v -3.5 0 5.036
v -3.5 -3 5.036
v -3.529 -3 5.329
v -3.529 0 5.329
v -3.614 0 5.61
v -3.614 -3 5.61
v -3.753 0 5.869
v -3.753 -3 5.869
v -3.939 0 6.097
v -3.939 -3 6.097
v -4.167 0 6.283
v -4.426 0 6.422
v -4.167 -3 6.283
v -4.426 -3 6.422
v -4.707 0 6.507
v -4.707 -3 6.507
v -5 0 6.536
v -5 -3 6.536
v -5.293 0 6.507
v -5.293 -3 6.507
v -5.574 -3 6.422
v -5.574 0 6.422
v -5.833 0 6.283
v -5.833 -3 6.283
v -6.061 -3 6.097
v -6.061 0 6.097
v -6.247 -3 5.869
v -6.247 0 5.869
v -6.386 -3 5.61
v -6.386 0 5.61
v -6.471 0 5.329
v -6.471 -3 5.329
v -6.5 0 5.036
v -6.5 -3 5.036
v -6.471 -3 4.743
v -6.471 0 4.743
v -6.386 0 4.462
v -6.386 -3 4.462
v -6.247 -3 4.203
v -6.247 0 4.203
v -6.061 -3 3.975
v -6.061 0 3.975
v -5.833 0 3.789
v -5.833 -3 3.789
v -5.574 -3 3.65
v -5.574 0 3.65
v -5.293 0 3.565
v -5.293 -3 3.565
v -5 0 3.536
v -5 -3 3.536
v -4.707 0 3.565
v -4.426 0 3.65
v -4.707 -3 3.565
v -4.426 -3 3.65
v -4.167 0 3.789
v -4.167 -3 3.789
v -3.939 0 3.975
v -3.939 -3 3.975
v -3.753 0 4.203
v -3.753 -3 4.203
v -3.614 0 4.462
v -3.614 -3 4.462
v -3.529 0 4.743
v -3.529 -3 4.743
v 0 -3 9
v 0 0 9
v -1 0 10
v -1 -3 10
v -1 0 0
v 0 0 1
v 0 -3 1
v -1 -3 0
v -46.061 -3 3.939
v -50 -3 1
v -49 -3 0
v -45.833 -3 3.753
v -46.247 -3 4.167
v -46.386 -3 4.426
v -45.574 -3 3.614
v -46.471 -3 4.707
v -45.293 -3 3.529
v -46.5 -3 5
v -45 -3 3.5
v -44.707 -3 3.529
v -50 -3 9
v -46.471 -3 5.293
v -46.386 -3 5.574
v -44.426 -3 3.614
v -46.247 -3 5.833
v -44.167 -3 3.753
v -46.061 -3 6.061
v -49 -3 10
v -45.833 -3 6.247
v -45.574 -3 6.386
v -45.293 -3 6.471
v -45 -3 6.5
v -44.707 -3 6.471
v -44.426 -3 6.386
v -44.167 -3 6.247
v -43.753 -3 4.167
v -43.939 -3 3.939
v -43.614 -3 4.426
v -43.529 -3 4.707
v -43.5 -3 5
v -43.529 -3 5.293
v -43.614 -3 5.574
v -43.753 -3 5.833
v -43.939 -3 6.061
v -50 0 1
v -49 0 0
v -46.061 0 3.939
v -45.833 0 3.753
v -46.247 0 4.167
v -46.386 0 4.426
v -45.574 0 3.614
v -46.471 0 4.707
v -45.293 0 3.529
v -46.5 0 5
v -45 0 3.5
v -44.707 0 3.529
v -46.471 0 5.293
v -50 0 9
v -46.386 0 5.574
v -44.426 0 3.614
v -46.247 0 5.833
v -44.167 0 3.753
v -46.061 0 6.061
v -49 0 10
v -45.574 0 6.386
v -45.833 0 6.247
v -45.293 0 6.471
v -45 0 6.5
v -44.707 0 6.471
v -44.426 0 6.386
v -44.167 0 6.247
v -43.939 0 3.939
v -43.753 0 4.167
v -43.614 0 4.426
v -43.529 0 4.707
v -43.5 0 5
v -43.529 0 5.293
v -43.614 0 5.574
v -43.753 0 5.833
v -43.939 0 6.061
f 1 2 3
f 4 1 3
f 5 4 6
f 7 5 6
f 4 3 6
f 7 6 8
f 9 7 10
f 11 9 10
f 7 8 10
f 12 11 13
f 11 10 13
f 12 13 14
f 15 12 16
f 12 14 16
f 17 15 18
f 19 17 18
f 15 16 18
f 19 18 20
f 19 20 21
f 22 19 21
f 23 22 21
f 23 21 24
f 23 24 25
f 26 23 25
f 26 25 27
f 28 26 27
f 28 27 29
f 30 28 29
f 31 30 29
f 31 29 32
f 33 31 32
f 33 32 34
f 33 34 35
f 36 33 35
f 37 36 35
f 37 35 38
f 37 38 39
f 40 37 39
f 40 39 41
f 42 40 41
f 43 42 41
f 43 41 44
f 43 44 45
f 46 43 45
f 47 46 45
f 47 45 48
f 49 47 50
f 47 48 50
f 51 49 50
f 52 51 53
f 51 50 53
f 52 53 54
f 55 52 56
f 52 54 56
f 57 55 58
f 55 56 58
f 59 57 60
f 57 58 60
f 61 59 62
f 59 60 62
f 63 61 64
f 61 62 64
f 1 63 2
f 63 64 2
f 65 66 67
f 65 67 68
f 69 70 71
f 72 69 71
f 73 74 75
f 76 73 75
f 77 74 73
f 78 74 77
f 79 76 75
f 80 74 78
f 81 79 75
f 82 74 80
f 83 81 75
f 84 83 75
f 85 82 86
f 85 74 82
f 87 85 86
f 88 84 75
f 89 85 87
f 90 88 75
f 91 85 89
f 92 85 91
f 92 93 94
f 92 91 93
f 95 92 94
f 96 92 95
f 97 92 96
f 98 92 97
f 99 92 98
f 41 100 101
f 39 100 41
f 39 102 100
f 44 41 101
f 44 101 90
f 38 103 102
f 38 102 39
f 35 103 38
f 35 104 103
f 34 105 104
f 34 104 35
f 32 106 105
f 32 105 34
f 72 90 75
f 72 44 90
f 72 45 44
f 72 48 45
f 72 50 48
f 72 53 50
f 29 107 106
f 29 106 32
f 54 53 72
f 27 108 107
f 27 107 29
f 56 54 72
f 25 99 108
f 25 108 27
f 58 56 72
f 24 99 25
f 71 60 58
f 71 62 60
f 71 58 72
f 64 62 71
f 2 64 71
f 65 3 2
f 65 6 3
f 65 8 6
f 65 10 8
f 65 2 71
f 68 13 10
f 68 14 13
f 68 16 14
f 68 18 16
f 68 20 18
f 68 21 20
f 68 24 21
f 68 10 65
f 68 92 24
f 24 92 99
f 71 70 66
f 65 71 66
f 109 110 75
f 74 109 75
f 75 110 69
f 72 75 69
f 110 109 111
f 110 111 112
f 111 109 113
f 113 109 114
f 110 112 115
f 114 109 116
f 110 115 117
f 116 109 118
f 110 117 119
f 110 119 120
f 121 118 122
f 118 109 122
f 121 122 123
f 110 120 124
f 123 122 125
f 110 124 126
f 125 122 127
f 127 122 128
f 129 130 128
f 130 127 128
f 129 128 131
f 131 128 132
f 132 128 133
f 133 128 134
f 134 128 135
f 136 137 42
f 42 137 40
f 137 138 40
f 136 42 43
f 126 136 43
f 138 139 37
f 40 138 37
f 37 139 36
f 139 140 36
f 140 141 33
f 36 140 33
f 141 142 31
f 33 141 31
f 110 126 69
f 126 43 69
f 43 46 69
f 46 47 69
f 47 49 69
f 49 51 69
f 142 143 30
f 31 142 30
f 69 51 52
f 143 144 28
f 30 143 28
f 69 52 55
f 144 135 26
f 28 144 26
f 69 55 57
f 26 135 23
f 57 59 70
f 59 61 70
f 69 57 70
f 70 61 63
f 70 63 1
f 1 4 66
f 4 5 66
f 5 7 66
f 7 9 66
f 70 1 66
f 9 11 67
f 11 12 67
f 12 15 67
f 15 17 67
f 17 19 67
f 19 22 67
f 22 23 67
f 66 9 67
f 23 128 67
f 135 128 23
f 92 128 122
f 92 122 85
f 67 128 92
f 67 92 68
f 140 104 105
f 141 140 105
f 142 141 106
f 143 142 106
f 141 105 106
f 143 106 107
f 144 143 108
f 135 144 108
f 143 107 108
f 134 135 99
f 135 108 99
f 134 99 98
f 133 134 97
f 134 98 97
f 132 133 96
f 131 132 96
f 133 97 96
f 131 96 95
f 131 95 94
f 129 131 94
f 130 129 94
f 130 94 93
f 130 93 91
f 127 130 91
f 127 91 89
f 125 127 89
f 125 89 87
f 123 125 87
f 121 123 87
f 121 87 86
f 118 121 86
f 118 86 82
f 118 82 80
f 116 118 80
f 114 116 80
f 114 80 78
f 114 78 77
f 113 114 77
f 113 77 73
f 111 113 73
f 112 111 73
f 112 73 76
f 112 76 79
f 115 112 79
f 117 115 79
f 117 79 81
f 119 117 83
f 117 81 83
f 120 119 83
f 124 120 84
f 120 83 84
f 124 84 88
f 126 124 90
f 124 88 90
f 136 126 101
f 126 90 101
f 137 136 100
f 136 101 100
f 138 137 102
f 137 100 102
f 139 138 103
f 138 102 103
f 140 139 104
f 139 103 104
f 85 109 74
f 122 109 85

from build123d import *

# Parameters (mm, degrees)
F0_W     = 50
F0_H     = 10
F1_DEPTH = 3
F2_R     = 1.5
F3_DEPTH = 5
F4_SIZE  = 1


with BuildPart() as f1:
    # F0 (on Front) → F1 (new body)
    with BuildSketch(Plane.XZ):
        with Locations((-25, 5)):
            Rectangle(F0_W, F0_H)
    extrude(amount=F1_DEPTH)

    # F2 (on face) → F3 (cut)
    with BuildSketch(Plane.XZ.offset(3)):
        with Locations((-45, 5)):
            Circle(F2_R)
        with Locations((-5, 5.036021)):
            Circle(F2_R)
    extrude(amount=-F3_DEPTH, mode=Mode.SUBTRACT)

    # F4
    f4_edges = [f1.edges().sort_by_distance(p)[0] for p in [
        (0, -1.5, 10),
        (0, -1.5, 0),
        (-50, -1.5, 10),
        (-50, -1.5, 0),
    ]]
    chamfer(f4_edges, length=F4_SIZE)


solid = f1.part
